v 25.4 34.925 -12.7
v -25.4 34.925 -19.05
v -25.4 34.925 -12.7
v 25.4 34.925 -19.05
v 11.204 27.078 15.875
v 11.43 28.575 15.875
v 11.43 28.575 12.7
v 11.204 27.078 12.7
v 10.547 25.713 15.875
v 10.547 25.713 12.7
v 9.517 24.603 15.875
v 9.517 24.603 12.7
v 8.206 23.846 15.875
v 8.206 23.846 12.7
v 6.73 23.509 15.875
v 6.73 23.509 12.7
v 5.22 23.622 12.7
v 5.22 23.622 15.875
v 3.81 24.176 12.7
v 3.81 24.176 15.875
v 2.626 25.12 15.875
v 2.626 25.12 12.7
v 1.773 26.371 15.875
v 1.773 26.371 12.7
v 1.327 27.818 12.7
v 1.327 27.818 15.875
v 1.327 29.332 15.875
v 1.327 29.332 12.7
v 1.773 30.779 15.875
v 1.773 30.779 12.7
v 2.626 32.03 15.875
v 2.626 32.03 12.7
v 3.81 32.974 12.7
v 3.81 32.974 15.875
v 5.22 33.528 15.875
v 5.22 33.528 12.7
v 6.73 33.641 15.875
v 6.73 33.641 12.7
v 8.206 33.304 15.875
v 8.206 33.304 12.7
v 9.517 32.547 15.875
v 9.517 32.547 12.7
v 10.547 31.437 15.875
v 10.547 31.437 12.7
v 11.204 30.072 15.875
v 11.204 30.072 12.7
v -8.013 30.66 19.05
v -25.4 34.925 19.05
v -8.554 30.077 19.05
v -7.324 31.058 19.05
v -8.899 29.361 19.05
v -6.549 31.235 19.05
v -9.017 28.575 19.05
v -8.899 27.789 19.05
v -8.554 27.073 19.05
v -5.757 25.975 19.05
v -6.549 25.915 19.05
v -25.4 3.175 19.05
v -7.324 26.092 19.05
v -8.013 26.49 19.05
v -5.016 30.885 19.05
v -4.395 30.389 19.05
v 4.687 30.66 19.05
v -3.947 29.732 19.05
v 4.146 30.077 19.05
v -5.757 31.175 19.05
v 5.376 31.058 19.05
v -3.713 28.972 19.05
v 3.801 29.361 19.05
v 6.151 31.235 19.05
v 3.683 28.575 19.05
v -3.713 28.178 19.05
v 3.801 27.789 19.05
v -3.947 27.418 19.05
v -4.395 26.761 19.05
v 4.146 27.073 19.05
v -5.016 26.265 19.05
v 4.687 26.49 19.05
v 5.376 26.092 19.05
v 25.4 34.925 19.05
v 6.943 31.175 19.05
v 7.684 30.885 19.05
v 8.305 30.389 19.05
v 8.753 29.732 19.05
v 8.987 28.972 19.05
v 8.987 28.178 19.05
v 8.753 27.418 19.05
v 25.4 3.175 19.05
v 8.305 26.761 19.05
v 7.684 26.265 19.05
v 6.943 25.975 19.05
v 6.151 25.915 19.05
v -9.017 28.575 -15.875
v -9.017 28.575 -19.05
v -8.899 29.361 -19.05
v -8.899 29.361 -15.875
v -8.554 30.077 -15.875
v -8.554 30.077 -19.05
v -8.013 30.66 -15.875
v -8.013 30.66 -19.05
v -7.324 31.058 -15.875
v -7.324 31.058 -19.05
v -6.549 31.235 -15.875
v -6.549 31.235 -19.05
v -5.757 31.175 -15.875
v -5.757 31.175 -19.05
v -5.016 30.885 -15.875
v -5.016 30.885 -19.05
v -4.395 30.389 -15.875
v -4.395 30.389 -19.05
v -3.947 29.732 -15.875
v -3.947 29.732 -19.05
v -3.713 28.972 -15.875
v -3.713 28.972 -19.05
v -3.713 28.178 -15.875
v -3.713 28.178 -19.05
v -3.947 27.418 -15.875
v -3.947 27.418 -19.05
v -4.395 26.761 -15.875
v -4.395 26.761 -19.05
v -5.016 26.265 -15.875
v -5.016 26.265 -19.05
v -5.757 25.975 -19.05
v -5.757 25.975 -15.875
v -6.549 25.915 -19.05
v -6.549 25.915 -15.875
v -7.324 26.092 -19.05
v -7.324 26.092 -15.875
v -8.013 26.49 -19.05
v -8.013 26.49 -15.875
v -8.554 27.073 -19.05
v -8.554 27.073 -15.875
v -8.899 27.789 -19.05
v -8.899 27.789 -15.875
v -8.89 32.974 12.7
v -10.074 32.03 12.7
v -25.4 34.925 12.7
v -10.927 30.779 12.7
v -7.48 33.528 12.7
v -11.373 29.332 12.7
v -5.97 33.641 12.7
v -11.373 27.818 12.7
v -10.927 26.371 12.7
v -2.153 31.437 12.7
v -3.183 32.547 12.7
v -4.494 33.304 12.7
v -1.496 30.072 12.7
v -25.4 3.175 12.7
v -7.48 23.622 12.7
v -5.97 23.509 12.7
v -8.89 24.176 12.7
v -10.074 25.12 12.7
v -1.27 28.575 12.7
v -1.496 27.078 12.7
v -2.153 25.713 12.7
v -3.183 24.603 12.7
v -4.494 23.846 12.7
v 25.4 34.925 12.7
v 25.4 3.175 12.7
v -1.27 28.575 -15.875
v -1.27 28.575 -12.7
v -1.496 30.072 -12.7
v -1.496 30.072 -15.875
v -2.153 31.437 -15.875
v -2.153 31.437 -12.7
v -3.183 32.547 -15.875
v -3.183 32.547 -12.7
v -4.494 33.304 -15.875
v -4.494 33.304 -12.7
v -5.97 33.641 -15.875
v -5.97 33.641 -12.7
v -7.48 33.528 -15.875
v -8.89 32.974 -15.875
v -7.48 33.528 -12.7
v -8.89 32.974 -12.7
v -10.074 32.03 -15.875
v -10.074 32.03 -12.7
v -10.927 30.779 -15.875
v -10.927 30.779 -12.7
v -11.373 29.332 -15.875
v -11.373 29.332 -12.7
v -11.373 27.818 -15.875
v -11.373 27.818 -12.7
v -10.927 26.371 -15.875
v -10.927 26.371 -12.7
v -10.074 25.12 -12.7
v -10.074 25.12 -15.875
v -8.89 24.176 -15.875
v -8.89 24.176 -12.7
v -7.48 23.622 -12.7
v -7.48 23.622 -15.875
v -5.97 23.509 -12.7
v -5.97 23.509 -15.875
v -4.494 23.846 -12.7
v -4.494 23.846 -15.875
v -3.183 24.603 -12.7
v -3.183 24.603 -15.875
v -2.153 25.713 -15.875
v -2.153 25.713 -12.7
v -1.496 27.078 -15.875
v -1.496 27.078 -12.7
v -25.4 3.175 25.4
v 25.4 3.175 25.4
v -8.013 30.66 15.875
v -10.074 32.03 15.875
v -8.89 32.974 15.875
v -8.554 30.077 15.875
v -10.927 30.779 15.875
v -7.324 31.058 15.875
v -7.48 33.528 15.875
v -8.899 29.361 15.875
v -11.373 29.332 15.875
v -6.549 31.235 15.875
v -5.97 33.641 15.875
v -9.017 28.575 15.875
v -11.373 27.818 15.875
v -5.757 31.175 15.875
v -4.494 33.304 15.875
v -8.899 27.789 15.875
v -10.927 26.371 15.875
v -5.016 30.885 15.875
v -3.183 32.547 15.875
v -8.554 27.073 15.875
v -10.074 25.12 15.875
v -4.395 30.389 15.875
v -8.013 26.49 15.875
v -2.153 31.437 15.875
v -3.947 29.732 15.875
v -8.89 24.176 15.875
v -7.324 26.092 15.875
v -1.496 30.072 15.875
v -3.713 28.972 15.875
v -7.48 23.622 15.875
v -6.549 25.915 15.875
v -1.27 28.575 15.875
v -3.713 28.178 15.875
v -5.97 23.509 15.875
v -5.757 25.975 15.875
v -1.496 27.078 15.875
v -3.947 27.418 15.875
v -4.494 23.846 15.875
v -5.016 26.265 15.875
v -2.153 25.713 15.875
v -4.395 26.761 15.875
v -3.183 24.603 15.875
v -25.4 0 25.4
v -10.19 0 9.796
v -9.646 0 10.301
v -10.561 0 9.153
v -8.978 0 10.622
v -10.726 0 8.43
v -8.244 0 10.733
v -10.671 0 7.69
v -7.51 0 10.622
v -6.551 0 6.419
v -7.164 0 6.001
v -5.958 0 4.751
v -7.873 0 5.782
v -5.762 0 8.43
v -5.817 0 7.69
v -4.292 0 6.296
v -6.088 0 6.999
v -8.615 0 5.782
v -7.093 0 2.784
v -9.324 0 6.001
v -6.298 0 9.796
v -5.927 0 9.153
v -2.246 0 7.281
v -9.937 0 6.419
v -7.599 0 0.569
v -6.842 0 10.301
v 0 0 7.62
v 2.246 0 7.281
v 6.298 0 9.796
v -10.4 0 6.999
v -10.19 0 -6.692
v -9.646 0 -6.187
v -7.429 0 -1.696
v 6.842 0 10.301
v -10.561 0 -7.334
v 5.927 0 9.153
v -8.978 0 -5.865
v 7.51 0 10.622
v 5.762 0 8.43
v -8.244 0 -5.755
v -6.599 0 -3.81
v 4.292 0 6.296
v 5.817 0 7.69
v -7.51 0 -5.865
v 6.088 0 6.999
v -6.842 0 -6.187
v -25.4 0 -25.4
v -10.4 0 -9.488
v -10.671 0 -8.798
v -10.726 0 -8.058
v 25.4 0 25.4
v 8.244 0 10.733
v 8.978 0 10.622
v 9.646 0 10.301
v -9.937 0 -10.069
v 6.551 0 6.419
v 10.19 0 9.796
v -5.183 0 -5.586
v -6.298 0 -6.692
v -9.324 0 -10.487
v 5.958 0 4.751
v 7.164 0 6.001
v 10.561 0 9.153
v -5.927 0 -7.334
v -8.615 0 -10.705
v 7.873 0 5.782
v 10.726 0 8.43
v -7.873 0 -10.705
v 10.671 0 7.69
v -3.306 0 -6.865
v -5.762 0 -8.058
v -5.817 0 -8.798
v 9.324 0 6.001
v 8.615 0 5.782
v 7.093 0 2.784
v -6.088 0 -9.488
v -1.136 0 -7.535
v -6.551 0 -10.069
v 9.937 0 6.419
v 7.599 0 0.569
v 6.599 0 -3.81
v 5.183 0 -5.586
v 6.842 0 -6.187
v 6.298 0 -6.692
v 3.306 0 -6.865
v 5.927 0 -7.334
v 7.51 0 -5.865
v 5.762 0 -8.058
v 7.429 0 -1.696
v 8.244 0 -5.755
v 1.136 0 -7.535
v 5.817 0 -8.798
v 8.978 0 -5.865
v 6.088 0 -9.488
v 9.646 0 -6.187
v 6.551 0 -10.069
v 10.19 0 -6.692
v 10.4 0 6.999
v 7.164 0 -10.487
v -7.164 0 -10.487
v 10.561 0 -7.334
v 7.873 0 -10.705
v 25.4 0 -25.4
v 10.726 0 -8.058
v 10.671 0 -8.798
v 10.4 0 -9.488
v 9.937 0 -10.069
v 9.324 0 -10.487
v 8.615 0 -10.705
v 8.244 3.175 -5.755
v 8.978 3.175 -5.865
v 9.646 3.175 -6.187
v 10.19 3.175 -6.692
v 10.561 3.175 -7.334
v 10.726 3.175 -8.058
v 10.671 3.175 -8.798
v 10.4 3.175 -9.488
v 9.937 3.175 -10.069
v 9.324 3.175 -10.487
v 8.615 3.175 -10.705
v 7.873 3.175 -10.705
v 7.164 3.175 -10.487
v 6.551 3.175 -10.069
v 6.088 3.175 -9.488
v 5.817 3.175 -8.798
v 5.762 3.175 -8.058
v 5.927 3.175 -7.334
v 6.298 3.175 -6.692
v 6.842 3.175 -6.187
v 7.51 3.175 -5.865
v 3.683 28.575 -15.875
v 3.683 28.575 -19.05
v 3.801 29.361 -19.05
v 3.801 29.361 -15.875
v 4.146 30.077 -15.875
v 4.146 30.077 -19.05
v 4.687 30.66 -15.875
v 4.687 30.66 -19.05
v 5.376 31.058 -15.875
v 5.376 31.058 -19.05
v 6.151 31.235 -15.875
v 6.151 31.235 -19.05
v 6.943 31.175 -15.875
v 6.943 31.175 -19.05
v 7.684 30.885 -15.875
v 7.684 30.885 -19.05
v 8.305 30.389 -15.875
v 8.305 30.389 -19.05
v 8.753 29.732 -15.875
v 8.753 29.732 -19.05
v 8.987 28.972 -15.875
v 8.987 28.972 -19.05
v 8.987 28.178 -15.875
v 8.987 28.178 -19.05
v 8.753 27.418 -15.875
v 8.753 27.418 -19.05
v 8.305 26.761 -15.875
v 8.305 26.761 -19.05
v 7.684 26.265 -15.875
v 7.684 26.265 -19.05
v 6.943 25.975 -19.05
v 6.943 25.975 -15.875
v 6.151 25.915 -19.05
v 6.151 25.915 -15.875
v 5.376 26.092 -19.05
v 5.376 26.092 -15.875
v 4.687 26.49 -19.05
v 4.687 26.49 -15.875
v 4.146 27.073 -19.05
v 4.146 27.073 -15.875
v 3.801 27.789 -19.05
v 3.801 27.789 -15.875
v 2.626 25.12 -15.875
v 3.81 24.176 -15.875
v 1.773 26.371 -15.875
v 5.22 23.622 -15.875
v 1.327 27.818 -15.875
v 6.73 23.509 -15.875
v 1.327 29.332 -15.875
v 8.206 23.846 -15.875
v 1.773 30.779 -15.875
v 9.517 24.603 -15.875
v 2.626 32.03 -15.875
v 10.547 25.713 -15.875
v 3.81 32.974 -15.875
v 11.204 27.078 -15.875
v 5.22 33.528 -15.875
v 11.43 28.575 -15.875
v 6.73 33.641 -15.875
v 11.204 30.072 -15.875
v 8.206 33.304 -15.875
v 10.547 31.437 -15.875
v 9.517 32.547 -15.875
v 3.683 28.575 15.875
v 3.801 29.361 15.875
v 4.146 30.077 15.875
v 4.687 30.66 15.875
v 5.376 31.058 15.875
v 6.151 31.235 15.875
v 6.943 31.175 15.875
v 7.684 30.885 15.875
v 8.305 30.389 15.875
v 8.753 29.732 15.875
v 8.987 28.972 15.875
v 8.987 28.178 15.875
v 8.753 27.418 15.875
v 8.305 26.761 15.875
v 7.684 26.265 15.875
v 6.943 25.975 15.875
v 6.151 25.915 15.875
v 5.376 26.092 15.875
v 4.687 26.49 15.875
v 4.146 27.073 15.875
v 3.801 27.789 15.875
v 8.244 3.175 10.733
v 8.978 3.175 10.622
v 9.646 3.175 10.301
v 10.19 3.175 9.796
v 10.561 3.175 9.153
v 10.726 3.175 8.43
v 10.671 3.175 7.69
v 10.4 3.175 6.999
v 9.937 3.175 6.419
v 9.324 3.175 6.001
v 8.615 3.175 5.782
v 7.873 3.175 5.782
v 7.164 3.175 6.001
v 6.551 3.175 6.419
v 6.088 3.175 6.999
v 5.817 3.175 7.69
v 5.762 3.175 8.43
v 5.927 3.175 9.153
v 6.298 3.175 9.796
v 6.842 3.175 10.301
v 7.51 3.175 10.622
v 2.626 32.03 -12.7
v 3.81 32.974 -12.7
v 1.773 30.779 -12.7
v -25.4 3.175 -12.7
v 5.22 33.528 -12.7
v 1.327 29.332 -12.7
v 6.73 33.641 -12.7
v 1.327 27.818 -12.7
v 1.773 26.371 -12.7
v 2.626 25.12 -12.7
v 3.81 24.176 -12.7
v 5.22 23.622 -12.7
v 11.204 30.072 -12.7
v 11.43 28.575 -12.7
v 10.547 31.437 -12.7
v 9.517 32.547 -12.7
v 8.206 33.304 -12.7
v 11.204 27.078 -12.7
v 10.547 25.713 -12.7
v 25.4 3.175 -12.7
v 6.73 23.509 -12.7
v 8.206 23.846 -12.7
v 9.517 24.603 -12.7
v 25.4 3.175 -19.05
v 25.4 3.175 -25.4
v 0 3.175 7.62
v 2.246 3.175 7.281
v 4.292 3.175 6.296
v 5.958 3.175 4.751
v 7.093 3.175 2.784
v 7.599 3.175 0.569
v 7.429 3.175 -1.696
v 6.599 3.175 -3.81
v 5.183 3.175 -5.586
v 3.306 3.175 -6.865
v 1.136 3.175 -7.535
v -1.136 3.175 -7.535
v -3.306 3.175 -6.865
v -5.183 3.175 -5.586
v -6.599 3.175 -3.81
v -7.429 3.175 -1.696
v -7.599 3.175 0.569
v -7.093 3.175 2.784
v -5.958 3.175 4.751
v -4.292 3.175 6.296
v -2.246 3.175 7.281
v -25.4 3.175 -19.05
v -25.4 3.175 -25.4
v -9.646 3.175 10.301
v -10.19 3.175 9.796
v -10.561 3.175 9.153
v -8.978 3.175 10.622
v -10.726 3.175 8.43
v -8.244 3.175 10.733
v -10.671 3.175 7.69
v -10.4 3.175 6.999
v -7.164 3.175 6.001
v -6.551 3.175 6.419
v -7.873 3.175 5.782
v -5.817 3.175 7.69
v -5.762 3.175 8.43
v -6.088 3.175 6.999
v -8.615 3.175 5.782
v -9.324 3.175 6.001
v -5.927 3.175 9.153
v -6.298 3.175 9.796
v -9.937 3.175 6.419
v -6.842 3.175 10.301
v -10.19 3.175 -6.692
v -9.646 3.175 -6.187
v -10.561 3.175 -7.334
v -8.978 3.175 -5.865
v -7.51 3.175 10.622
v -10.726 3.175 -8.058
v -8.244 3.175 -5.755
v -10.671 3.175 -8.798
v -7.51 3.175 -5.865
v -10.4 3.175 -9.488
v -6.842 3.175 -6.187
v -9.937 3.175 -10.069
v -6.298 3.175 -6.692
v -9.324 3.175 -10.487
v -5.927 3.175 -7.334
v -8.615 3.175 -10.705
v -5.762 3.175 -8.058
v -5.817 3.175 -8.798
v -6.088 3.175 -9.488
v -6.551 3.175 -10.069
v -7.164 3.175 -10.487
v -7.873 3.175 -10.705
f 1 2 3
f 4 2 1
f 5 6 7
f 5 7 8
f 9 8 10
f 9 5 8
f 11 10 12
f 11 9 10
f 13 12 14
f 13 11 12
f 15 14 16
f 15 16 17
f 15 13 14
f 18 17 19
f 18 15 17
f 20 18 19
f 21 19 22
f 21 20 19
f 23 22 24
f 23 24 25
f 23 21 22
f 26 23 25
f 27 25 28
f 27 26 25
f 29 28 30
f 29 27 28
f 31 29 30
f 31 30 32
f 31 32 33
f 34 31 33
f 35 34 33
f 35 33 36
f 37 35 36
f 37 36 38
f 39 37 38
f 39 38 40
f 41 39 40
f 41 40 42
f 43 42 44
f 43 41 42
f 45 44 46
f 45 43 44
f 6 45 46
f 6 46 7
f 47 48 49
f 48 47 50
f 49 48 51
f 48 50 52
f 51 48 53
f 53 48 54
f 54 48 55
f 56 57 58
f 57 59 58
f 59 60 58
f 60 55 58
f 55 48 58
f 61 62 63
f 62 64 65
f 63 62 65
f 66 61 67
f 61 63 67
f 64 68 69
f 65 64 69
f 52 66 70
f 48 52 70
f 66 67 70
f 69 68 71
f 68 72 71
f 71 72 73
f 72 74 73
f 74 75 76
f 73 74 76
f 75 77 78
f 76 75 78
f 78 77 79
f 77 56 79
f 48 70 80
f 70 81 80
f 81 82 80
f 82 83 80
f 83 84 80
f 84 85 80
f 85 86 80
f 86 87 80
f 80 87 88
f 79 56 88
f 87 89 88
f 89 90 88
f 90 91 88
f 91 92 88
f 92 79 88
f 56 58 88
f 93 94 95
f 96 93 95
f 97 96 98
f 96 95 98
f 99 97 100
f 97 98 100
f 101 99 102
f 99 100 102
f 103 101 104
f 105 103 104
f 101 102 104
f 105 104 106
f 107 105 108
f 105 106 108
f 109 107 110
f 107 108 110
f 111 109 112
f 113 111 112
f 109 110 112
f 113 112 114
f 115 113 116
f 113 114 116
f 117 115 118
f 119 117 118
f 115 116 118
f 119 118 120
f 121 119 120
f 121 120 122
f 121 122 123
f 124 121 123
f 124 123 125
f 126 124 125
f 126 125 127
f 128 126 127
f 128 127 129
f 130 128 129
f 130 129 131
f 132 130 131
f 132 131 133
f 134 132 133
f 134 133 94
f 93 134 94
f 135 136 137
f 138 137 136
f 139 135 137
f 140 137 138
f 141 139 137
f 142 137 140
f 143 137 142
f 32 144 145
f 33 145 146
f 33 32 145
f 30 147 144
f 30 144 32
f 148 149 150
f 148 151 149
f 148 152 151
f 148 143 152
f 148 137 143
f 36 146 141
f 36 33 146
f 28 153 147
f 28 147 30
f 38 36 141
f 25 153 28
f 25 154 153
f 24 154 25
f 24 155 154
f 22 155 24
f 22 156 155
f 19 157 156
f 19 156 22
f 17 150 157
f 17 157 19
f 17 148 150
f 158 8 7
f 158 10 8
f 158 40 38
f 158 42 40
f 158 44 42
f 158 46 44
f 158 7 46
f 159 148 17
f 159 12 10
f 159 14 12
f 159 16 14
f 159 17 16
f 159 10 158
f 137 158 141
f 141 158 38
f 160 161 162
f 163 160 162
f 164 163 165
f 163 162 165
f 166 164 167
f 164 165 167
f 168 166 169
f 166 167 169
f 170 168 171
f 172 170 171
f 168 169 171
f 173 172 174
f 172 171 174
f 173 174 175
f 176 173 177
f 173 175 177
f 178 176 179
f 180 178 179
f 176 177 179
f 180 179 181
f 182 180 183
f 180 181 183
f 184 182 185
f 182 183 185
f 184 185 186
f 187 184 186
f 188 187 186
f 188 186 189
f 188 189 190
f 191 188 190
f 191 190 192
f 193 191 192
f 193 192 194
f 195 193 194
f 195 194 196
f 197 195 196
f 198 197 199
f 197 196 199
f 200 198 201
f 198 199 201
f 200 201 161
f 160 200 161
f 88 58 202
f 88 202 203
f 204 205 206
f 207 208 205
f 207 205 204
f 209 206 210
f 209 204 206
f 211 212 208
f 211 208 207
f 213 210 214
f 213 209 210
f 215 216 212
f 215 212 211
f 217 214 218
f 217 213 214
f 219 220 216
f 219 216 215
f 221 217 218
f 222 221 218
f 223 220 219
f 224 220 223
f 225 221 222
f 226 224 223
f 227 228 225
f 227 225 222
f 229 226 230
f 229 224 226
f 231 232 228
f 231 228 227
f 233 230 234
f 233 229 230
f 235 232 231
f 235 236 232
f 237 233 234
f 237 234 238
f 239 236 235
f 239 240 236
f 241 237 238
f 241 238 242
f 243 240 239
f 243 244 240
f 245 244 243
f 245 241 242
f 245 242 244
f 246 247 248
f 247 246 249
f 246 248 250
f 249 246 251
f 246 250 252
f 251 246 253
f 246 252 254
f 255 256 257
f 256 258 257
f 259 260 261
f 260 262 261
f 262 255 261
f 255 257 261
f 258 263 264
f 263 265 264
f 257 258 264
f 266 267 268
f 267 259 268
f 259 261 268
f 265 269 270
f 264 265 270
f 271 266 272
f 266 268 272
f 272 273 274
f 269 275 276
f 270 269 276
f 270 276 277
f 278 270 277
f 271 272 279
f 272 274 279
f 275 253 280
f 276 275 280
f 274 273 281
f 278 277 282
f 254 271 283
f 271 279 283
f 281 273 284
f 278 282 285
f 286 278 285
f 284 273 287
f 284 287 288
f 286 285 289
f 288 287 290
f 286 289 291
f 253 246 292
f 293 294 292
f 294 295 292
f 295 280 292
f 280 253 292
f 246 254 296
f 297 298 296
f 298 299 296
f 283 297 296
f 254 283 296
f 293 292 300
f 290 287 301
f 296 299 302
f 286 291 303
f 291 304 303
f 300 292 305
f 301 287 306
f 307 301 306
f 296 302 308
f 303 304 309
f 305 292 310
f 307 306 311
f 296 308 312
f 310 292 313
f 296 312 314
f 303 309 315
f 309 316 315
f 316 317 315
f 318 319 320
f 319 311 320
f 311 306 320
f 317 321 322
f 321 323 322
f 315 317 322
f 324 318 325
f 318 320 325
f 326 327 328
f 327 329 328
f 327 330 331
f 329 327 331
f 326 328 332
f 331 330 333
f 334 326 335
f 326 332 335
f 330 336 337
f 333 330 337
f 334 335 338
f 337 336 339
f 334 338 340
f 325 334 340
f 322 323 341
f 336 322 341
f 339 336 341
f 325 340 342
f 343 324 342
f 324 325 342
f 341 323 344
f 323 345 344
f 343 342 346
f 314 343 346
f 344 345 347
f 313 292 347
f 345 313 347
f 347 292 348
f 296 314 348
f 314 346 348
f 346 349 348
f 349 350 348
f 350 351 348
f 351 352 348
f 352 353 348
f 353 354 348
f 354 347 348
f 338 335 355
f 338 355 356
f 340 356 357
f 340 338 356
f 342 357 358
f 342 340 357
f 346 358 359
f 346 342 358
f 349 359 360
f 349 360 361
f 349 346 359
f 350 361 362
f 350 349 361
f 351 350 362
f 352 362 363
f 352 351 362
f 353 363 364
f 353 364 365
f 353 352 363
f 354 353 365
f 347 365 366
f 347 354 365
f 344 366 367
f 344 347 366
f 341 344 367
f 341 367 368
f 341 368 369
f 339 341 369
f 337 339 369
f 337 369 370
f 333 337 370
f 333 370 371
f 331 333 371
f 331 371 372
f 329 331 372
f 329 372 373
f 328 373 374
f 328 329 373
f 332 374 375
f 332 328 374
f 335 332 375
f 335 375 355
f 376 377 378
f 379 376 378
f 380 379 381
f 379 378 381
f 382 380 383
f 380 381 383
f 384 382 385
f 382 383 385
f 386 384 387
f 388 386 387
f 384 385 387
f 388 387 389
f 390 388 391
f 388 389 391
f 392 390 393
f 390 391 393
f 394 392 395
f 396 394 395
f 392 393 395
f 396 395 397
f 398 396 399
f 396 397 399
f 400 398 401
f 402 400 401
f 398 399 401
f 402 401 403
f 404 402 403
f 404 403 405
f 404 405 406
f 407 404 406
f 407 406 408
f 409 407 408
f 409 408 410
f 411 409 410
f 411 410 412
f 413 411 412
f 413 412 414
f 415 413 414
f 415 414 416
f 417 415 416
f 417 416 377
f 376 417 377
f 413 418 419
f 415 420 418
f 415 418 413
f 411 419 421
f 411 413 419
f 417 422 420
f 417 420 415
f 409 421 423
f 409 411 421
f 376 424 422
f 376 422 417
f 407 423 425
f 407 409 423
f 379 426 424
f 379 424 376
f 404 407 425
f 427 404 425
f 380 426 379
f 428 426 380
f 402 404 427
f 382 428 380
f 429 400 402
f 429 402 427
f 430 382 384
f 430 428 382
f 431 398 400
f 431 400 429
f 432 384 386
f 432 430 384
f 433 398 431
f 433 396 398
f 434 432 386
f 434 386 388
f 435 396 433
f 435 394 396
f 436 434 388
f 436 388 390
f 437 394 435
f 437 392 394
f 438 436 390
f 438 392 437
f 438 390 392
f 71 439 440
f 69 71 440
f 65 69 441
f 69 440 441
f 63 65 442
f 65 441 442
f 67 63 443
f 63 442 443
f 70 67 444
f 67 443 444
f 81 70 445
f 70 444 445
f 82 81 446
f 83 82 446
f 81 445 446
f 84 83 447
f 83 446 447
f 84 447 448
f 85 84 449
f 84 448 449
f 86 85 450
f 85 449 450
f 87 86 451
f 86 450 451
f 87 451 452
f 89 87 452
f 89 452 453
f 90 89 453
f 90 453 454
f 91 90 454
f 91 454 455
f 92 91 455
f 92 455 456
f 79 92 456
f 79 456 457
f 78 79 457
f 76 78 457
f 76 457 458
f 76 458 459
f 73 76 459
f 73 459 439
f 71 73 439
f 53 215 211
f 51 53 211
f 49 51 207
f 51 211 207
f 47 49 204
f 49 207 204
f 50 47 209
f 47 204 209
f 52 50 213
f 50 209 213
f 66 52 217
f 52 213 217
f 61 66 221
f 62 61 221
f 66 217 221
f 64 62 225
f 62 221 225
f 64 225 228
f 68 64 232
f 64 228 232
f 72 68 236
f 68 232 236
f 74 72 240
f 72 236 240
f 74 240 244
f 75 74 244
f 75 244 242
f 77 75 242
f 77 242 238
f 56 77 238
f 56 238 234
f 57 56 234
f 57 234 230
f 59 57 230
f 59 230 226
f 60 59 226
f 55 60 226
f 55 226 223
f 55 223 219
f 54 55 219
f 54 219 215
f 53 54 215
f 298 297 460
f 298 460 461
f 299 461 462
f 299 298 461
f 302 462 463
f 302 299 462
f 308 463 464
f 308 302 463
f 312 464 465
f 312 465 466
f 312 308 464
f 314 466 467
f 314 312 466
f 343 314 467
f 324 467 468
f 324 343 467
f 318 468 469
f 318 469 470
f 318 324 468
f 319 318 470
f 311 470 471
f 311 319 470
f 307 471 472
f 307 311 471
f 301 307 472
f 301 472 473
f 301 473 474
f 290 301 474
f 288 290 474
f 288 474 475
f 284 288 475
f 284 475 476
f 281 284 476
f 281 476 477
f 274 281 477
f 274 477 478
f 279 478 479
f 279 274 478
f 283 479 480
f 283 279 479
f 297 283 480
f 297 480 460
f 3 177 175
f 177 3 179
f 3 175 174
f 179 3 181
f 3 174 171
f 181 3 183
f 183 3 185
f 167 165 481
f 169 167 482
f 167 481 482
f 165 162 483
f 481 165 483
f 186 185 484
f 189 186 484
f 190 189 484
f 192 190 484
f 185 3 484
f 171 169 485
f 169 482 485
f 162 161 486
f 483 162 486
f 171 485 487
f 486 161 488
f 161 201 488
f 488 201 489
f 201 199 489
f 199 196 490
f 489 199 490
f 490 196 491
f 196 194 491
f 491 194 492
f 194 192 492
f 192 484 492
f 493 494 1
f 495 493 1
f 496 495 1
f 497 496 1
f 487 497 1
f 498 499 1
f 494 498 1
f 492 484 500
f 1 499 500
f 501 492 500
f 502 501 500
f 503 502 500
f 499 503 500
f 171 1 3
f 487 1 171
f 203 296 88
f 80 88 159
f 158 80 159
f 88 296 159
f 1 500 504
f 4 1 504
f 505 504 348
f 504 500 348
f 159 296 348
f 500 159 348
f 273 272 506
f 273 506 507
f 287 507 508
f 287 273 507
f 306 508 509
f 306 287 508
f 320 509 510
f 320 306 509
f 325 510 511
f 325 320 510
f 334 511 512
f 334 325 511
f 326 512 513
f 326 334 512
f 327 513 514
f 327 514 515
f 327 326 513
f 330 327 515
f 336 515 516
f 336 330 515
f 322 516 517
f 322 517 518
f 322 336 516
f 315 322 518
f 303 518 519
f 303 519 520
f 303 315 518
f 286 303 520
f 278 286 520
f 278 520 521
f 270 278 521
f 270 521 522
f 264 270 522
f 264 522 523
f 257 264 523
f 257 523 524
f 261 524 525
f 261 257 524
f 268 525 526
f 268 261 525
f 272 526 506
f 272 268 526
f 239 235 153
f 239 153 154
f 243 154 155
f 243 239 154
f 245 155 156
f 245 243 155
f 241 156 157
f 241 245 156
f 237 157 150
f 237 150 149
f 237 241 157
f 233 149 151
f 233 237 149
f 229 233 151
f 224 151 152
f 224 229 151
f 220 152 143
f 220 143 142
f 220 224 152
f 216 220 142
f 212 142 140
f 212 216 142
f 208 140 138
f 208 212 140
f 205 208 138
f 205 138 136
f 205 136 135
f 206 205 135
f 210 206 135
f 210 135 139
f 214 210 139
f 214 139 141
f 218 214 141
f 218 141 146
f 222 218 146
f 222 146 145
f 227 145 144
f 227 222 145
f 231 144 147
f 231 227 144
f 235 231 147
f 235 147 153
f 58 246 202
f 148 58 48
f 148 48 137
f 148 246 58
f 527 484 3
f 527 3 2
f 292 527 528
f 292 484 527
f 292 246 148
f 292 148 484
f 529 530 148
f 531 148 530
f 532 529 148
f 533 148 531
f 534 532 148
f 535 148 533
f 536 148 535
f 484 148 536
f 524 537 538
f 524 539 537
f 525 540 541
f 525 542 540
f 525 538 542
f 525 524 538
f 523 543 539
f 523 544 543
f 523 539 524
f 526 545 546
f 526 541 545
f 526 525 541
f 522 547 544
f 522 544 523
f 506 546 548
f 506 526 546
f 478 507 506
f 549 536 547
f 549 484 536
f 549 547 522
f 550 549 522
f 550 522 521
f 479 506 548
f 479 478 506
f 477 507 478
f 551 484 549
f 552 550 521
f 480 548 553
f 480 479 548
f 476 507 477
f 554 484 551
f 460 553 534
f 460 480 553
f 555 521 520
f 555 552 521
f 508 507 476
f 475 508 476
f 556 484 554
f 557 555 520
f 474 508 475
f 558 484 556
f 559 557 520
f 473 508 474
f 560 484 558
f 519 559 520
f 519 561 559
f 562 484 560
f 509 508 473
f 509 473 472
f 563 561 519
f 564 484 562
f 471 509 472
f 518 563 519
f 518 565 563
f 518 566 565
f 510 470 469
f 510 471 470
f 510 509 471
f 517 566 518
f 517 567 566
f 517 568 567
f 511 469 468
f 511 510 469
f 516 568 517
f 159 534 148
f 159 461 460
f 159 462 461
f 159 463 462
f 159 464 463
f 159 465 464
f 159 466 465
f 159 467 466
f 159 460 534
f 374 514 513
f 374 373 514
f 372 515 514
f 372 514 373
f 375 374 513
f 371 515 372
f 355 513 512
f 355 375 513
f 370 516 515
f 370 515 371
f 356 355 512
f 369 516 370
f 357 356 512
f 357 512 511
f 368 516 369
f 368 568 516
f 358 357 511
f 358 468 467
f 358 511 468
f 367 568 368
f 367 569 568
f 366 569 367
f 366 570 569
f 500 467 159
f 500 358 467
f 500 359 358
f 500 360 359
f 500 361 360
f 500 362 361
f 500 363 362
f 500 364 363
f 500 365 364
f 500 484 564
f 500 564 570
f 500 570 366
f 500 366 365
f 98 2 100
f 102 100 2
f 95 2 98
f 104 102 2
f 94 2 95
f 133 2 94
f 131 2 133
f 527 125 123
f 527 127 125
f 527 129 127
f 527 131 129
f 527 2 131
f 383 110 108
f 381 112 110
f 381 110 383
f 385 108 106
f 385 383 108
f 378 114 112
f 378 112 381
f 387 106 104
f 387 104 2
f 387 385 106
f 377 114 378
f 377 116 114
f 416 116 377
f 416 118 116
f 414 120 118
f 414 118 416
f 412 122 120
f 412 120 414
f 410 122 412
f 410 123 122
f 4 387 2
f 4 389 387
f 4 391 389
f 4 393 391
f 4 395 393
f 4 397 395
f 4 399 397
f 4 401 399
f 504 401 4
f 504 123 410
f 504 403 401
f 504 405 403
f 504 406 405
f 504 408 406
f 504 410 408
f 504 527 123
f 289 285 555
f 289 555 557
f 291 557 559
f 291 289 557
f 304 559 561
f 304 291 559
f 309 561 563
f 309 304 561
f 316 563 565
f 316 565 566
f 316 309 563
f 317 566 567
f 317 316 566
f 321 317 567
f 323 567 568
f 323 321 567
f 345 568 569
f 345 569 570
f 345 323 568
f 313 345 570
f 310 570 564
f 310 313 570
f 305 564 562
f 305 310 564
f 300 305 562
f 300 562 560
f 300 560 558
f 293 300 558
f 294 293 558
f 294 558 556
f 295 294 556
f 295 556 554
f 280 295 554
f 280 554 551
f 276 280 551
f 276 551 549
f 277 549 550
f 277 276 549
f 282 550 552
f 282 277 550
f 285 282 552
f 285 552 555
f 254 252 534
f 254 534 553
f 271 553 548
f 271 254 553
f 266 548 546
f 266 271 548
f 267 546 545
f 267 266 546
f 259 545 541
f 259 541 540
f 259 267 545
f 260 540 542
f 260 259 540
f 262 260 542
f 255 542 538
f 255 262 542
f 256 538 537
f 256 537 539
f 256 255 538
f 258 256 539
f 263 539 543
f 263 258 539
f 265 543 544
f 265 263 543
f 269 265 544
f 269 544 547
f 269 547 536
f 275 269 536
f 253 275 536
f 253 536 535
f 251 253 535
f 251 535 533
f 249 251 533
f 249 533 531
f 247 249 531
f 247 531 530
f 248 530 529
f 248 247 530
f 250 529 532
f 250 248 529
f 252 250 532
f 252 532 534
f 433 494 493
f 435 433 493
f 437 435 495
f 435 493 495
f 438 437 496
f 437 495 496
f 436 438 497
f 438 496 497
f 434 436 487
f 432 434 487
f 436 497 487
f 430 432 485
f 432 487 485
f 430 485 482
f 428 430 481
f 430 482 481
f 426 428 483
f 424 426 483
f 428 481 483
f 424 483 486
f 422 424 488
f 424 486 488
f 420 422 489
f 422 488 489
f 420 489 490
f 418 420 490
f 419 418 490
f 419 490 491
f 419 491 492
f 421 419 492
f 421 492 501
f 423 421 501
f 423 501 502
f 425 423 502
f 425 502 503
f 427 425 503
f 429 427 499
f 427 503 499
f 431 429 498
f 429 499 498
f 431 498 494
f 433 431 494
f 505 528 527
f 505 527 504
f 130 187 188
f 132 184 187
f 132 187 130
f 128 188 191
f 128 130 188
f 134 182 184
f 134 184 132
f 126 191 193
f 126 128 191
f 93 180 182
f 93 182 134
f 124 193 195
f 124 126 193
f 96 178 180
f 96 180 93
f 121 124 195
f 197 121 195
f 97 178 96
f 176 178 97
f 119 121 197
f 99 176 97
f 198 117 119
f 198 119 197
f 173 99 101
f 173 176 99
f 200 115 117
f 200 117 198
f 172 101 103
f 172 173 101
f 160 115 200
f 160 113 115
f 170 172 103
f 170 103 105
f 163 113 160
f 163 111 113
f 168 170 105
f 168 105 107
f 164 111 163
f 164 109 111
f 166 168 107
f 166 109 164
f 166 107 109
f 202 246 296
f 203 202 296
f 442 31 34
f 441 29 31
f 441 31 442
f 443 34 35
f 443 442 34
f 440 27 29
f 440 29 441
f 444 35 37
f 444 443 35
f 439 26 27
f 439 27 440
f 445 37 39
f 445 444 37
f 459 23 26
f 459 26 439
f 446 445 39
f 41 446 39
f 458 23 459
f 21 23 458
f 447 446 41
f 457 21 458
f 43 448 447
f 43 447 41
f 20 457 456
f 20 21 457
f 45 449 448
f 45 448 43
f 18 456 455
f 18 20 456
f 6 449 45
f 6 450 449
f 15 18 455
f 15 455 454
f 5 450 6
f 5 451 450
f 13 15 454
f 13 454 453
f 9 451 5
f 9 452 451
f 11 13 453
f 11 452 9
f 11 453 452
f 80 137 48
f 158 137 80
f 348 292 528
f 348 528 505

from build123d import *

# Parameters (mm, degrees)
SKETCH1_W           = 50.8
SKETCH1_H           = 50.8
SKETCH1_R           = 2.4892
SKETCH1_R_2         = 7.62
BOSS_EXTRUDE1_DEPTH = 3.175
SKETCH2_W           = 50.8
SKETCH2_H           = 6.35
BOSS_EXTRUDE2_DEPTH = 31.75
CUT_EXTRUDE1_REACH  = 63.974
SKETCH3_R           = 2.667
SKETCH5_R           = 5.08
CUT_EXTRUDE2_DEPTH  = 3.175
CUT_EXTRUDE3_START  = -3.175
SKETCH6_R           = 5.08
CUT_EXTRUDE3_DEPTH  = 3.175


with BuildPart() as part:
    # Sketch1 → Boss-Extrude1 (new body)
    with BuildSketch(Plane(origin=(0, 0, 0), x_dir=(1, 0, 0), z_dir=(0, 1, 0))):
        Rectangle(SKETCH1_W, SKETCH1_H)
        with Locations(Location((-8.243875119, 8.243875119, 0), (0, 0, 270))):
            Circle(SKETCH1_R, mode=Mode.SUBTRACT)
        with Locations(Location((8.243875119, 8.243875119, 0), (0, 0, 270))):
            Circle(SKETCH1_R, mode=Mode.SUBTRACT)
        with Locations(Location((8.243875119, -8.243875119, 0), (0, 0, 270))):
            Circle(SKETCH1_R, mode=Mode.SUBTRACT)
        with Locations(Location((-8.243875119, -8.243875119, 0), (0, 0, 270))):
            Circle(SKETCH1_R, mode=Mode.SUBTRACT)
        with Locations(Location((0, 0, 0), (0, 0, 270))):
            Circle(SKETCH1_R_2, mode=Mode.SUBTRACT)
    extrude(amount=BOSS_EXTRUDE1_DEPTH)

    # Sketch2 → Boss-Extrude2 (add)
    with BuildSketch(Plane(origin=(0, 3.175, 0), x_dir=(1, 0, 0), z_dir=(0, 1, 0))):
        with Locations((0, 15.875)):
            Rectangle(SKETCH2_W, SKETCH2_H)
        with Locations((0, -15.875)):
            Rectangle(SKETCH2_W, SKETCH2_H)
    extrude(amount=BOSS_EXTRUDE2_DEPTH)

    # Cut-Extrude1: up to this face of the body (flat: up to its plane)
    cut_extrude1_end = Plane(part.part.faces().sort_by_distance((0, 19.05, 19.05))[0])
    # Sketch3 → Cut-Extrude1 (cut, up to the picked face)
    with BuildSketch(Plane(origin=(0, 0, -19.05), x_dir=(-1, 0, 0), z_dir=(0, 0, -1)), mode=Mode.PRIVATE) as cut_extrude1_sk1:
        with Locations((-6.35, 28.575)):
            Circle(SKETCH3_R)
    cut_extrude1_tool1 = split(extrude(cut_extrude1_sk1.sketch, amount=-CUT_EXTRUDE1_REACH, mode=Mode.PRIVATE), bisect_by=cut_extrude1_end, keep=Keep.BOTH, mode=Mode.PRIVATE)
    # Sketch3 → Cut-Extrude1 (cut, up to the picked face)
    with BuildSketch(Plane(origin=(0, 0, -19.05), x_dir=(-1, 0, 0), z_dir=(0, 0, -1)), mode=Mode.PRIVATE) as cut_extrude1_sk2:
        with Locations((6.35, 28.575)):
            Circle(SKETCH3_R)
    cut_extrude1_tool2 = split(extrude(cut_extrude1_sk2.sketch, amount=-CUT_EXTRUDE1_REACH, mode=Mode.PRIVATE), bisect_by=cut_extrude1_end, keep=Keep.BOTH, mode=Mode.PRIVATE)
    add(cut_extrude1_tool1.solids().sort_by(Axis((6.35, 28.575, -19.05), (0, 0, 1)))[0], mode=Mode.SUBTRACT)
    add(cut_extrude1_tool2.solids().sort_by(Axis((-6.35, 28.575, -19.05), (0, 0, 1)))[0], mode=Mode.SUBTRACT)

    # Sketch5 → Cut-Extrude2 (cut)
    with BuildSketch(Plane.XY.offset(-12.7)):
        with Locations((-6.35, 28.575)):
            Circle(SKETCH5_R)
        with Locations((6.35, 28.575)):
            Circle(SKETCH5_R)
    extrude(amount=-CUT_EXTRUDE2_DEPTH, mode=Mode.SUBTRACT)

    # Sketch6 → Cut-Extrude3 (cut)
    with BuildSketch(Plane(origin=(0, 0, 12.7), x_dir=(-1, 0, 0), z_dir=(0, 0, -1)).offset(CUT_EXTRUDE3_START)):
        with Locations(Location((-6.35, 28.575, 0), (0, 0, 180))):
            Circle(SKETCH6_R)
        with Locations(Location((6.35, 28.575, 0), (0, 0, 180))):
            Circle(SKETCH6_R)
    extrude(amount=CUT_EXTRUDE3_DEPTH, mode=Mode.SUBTRACT)


solid = part.part
